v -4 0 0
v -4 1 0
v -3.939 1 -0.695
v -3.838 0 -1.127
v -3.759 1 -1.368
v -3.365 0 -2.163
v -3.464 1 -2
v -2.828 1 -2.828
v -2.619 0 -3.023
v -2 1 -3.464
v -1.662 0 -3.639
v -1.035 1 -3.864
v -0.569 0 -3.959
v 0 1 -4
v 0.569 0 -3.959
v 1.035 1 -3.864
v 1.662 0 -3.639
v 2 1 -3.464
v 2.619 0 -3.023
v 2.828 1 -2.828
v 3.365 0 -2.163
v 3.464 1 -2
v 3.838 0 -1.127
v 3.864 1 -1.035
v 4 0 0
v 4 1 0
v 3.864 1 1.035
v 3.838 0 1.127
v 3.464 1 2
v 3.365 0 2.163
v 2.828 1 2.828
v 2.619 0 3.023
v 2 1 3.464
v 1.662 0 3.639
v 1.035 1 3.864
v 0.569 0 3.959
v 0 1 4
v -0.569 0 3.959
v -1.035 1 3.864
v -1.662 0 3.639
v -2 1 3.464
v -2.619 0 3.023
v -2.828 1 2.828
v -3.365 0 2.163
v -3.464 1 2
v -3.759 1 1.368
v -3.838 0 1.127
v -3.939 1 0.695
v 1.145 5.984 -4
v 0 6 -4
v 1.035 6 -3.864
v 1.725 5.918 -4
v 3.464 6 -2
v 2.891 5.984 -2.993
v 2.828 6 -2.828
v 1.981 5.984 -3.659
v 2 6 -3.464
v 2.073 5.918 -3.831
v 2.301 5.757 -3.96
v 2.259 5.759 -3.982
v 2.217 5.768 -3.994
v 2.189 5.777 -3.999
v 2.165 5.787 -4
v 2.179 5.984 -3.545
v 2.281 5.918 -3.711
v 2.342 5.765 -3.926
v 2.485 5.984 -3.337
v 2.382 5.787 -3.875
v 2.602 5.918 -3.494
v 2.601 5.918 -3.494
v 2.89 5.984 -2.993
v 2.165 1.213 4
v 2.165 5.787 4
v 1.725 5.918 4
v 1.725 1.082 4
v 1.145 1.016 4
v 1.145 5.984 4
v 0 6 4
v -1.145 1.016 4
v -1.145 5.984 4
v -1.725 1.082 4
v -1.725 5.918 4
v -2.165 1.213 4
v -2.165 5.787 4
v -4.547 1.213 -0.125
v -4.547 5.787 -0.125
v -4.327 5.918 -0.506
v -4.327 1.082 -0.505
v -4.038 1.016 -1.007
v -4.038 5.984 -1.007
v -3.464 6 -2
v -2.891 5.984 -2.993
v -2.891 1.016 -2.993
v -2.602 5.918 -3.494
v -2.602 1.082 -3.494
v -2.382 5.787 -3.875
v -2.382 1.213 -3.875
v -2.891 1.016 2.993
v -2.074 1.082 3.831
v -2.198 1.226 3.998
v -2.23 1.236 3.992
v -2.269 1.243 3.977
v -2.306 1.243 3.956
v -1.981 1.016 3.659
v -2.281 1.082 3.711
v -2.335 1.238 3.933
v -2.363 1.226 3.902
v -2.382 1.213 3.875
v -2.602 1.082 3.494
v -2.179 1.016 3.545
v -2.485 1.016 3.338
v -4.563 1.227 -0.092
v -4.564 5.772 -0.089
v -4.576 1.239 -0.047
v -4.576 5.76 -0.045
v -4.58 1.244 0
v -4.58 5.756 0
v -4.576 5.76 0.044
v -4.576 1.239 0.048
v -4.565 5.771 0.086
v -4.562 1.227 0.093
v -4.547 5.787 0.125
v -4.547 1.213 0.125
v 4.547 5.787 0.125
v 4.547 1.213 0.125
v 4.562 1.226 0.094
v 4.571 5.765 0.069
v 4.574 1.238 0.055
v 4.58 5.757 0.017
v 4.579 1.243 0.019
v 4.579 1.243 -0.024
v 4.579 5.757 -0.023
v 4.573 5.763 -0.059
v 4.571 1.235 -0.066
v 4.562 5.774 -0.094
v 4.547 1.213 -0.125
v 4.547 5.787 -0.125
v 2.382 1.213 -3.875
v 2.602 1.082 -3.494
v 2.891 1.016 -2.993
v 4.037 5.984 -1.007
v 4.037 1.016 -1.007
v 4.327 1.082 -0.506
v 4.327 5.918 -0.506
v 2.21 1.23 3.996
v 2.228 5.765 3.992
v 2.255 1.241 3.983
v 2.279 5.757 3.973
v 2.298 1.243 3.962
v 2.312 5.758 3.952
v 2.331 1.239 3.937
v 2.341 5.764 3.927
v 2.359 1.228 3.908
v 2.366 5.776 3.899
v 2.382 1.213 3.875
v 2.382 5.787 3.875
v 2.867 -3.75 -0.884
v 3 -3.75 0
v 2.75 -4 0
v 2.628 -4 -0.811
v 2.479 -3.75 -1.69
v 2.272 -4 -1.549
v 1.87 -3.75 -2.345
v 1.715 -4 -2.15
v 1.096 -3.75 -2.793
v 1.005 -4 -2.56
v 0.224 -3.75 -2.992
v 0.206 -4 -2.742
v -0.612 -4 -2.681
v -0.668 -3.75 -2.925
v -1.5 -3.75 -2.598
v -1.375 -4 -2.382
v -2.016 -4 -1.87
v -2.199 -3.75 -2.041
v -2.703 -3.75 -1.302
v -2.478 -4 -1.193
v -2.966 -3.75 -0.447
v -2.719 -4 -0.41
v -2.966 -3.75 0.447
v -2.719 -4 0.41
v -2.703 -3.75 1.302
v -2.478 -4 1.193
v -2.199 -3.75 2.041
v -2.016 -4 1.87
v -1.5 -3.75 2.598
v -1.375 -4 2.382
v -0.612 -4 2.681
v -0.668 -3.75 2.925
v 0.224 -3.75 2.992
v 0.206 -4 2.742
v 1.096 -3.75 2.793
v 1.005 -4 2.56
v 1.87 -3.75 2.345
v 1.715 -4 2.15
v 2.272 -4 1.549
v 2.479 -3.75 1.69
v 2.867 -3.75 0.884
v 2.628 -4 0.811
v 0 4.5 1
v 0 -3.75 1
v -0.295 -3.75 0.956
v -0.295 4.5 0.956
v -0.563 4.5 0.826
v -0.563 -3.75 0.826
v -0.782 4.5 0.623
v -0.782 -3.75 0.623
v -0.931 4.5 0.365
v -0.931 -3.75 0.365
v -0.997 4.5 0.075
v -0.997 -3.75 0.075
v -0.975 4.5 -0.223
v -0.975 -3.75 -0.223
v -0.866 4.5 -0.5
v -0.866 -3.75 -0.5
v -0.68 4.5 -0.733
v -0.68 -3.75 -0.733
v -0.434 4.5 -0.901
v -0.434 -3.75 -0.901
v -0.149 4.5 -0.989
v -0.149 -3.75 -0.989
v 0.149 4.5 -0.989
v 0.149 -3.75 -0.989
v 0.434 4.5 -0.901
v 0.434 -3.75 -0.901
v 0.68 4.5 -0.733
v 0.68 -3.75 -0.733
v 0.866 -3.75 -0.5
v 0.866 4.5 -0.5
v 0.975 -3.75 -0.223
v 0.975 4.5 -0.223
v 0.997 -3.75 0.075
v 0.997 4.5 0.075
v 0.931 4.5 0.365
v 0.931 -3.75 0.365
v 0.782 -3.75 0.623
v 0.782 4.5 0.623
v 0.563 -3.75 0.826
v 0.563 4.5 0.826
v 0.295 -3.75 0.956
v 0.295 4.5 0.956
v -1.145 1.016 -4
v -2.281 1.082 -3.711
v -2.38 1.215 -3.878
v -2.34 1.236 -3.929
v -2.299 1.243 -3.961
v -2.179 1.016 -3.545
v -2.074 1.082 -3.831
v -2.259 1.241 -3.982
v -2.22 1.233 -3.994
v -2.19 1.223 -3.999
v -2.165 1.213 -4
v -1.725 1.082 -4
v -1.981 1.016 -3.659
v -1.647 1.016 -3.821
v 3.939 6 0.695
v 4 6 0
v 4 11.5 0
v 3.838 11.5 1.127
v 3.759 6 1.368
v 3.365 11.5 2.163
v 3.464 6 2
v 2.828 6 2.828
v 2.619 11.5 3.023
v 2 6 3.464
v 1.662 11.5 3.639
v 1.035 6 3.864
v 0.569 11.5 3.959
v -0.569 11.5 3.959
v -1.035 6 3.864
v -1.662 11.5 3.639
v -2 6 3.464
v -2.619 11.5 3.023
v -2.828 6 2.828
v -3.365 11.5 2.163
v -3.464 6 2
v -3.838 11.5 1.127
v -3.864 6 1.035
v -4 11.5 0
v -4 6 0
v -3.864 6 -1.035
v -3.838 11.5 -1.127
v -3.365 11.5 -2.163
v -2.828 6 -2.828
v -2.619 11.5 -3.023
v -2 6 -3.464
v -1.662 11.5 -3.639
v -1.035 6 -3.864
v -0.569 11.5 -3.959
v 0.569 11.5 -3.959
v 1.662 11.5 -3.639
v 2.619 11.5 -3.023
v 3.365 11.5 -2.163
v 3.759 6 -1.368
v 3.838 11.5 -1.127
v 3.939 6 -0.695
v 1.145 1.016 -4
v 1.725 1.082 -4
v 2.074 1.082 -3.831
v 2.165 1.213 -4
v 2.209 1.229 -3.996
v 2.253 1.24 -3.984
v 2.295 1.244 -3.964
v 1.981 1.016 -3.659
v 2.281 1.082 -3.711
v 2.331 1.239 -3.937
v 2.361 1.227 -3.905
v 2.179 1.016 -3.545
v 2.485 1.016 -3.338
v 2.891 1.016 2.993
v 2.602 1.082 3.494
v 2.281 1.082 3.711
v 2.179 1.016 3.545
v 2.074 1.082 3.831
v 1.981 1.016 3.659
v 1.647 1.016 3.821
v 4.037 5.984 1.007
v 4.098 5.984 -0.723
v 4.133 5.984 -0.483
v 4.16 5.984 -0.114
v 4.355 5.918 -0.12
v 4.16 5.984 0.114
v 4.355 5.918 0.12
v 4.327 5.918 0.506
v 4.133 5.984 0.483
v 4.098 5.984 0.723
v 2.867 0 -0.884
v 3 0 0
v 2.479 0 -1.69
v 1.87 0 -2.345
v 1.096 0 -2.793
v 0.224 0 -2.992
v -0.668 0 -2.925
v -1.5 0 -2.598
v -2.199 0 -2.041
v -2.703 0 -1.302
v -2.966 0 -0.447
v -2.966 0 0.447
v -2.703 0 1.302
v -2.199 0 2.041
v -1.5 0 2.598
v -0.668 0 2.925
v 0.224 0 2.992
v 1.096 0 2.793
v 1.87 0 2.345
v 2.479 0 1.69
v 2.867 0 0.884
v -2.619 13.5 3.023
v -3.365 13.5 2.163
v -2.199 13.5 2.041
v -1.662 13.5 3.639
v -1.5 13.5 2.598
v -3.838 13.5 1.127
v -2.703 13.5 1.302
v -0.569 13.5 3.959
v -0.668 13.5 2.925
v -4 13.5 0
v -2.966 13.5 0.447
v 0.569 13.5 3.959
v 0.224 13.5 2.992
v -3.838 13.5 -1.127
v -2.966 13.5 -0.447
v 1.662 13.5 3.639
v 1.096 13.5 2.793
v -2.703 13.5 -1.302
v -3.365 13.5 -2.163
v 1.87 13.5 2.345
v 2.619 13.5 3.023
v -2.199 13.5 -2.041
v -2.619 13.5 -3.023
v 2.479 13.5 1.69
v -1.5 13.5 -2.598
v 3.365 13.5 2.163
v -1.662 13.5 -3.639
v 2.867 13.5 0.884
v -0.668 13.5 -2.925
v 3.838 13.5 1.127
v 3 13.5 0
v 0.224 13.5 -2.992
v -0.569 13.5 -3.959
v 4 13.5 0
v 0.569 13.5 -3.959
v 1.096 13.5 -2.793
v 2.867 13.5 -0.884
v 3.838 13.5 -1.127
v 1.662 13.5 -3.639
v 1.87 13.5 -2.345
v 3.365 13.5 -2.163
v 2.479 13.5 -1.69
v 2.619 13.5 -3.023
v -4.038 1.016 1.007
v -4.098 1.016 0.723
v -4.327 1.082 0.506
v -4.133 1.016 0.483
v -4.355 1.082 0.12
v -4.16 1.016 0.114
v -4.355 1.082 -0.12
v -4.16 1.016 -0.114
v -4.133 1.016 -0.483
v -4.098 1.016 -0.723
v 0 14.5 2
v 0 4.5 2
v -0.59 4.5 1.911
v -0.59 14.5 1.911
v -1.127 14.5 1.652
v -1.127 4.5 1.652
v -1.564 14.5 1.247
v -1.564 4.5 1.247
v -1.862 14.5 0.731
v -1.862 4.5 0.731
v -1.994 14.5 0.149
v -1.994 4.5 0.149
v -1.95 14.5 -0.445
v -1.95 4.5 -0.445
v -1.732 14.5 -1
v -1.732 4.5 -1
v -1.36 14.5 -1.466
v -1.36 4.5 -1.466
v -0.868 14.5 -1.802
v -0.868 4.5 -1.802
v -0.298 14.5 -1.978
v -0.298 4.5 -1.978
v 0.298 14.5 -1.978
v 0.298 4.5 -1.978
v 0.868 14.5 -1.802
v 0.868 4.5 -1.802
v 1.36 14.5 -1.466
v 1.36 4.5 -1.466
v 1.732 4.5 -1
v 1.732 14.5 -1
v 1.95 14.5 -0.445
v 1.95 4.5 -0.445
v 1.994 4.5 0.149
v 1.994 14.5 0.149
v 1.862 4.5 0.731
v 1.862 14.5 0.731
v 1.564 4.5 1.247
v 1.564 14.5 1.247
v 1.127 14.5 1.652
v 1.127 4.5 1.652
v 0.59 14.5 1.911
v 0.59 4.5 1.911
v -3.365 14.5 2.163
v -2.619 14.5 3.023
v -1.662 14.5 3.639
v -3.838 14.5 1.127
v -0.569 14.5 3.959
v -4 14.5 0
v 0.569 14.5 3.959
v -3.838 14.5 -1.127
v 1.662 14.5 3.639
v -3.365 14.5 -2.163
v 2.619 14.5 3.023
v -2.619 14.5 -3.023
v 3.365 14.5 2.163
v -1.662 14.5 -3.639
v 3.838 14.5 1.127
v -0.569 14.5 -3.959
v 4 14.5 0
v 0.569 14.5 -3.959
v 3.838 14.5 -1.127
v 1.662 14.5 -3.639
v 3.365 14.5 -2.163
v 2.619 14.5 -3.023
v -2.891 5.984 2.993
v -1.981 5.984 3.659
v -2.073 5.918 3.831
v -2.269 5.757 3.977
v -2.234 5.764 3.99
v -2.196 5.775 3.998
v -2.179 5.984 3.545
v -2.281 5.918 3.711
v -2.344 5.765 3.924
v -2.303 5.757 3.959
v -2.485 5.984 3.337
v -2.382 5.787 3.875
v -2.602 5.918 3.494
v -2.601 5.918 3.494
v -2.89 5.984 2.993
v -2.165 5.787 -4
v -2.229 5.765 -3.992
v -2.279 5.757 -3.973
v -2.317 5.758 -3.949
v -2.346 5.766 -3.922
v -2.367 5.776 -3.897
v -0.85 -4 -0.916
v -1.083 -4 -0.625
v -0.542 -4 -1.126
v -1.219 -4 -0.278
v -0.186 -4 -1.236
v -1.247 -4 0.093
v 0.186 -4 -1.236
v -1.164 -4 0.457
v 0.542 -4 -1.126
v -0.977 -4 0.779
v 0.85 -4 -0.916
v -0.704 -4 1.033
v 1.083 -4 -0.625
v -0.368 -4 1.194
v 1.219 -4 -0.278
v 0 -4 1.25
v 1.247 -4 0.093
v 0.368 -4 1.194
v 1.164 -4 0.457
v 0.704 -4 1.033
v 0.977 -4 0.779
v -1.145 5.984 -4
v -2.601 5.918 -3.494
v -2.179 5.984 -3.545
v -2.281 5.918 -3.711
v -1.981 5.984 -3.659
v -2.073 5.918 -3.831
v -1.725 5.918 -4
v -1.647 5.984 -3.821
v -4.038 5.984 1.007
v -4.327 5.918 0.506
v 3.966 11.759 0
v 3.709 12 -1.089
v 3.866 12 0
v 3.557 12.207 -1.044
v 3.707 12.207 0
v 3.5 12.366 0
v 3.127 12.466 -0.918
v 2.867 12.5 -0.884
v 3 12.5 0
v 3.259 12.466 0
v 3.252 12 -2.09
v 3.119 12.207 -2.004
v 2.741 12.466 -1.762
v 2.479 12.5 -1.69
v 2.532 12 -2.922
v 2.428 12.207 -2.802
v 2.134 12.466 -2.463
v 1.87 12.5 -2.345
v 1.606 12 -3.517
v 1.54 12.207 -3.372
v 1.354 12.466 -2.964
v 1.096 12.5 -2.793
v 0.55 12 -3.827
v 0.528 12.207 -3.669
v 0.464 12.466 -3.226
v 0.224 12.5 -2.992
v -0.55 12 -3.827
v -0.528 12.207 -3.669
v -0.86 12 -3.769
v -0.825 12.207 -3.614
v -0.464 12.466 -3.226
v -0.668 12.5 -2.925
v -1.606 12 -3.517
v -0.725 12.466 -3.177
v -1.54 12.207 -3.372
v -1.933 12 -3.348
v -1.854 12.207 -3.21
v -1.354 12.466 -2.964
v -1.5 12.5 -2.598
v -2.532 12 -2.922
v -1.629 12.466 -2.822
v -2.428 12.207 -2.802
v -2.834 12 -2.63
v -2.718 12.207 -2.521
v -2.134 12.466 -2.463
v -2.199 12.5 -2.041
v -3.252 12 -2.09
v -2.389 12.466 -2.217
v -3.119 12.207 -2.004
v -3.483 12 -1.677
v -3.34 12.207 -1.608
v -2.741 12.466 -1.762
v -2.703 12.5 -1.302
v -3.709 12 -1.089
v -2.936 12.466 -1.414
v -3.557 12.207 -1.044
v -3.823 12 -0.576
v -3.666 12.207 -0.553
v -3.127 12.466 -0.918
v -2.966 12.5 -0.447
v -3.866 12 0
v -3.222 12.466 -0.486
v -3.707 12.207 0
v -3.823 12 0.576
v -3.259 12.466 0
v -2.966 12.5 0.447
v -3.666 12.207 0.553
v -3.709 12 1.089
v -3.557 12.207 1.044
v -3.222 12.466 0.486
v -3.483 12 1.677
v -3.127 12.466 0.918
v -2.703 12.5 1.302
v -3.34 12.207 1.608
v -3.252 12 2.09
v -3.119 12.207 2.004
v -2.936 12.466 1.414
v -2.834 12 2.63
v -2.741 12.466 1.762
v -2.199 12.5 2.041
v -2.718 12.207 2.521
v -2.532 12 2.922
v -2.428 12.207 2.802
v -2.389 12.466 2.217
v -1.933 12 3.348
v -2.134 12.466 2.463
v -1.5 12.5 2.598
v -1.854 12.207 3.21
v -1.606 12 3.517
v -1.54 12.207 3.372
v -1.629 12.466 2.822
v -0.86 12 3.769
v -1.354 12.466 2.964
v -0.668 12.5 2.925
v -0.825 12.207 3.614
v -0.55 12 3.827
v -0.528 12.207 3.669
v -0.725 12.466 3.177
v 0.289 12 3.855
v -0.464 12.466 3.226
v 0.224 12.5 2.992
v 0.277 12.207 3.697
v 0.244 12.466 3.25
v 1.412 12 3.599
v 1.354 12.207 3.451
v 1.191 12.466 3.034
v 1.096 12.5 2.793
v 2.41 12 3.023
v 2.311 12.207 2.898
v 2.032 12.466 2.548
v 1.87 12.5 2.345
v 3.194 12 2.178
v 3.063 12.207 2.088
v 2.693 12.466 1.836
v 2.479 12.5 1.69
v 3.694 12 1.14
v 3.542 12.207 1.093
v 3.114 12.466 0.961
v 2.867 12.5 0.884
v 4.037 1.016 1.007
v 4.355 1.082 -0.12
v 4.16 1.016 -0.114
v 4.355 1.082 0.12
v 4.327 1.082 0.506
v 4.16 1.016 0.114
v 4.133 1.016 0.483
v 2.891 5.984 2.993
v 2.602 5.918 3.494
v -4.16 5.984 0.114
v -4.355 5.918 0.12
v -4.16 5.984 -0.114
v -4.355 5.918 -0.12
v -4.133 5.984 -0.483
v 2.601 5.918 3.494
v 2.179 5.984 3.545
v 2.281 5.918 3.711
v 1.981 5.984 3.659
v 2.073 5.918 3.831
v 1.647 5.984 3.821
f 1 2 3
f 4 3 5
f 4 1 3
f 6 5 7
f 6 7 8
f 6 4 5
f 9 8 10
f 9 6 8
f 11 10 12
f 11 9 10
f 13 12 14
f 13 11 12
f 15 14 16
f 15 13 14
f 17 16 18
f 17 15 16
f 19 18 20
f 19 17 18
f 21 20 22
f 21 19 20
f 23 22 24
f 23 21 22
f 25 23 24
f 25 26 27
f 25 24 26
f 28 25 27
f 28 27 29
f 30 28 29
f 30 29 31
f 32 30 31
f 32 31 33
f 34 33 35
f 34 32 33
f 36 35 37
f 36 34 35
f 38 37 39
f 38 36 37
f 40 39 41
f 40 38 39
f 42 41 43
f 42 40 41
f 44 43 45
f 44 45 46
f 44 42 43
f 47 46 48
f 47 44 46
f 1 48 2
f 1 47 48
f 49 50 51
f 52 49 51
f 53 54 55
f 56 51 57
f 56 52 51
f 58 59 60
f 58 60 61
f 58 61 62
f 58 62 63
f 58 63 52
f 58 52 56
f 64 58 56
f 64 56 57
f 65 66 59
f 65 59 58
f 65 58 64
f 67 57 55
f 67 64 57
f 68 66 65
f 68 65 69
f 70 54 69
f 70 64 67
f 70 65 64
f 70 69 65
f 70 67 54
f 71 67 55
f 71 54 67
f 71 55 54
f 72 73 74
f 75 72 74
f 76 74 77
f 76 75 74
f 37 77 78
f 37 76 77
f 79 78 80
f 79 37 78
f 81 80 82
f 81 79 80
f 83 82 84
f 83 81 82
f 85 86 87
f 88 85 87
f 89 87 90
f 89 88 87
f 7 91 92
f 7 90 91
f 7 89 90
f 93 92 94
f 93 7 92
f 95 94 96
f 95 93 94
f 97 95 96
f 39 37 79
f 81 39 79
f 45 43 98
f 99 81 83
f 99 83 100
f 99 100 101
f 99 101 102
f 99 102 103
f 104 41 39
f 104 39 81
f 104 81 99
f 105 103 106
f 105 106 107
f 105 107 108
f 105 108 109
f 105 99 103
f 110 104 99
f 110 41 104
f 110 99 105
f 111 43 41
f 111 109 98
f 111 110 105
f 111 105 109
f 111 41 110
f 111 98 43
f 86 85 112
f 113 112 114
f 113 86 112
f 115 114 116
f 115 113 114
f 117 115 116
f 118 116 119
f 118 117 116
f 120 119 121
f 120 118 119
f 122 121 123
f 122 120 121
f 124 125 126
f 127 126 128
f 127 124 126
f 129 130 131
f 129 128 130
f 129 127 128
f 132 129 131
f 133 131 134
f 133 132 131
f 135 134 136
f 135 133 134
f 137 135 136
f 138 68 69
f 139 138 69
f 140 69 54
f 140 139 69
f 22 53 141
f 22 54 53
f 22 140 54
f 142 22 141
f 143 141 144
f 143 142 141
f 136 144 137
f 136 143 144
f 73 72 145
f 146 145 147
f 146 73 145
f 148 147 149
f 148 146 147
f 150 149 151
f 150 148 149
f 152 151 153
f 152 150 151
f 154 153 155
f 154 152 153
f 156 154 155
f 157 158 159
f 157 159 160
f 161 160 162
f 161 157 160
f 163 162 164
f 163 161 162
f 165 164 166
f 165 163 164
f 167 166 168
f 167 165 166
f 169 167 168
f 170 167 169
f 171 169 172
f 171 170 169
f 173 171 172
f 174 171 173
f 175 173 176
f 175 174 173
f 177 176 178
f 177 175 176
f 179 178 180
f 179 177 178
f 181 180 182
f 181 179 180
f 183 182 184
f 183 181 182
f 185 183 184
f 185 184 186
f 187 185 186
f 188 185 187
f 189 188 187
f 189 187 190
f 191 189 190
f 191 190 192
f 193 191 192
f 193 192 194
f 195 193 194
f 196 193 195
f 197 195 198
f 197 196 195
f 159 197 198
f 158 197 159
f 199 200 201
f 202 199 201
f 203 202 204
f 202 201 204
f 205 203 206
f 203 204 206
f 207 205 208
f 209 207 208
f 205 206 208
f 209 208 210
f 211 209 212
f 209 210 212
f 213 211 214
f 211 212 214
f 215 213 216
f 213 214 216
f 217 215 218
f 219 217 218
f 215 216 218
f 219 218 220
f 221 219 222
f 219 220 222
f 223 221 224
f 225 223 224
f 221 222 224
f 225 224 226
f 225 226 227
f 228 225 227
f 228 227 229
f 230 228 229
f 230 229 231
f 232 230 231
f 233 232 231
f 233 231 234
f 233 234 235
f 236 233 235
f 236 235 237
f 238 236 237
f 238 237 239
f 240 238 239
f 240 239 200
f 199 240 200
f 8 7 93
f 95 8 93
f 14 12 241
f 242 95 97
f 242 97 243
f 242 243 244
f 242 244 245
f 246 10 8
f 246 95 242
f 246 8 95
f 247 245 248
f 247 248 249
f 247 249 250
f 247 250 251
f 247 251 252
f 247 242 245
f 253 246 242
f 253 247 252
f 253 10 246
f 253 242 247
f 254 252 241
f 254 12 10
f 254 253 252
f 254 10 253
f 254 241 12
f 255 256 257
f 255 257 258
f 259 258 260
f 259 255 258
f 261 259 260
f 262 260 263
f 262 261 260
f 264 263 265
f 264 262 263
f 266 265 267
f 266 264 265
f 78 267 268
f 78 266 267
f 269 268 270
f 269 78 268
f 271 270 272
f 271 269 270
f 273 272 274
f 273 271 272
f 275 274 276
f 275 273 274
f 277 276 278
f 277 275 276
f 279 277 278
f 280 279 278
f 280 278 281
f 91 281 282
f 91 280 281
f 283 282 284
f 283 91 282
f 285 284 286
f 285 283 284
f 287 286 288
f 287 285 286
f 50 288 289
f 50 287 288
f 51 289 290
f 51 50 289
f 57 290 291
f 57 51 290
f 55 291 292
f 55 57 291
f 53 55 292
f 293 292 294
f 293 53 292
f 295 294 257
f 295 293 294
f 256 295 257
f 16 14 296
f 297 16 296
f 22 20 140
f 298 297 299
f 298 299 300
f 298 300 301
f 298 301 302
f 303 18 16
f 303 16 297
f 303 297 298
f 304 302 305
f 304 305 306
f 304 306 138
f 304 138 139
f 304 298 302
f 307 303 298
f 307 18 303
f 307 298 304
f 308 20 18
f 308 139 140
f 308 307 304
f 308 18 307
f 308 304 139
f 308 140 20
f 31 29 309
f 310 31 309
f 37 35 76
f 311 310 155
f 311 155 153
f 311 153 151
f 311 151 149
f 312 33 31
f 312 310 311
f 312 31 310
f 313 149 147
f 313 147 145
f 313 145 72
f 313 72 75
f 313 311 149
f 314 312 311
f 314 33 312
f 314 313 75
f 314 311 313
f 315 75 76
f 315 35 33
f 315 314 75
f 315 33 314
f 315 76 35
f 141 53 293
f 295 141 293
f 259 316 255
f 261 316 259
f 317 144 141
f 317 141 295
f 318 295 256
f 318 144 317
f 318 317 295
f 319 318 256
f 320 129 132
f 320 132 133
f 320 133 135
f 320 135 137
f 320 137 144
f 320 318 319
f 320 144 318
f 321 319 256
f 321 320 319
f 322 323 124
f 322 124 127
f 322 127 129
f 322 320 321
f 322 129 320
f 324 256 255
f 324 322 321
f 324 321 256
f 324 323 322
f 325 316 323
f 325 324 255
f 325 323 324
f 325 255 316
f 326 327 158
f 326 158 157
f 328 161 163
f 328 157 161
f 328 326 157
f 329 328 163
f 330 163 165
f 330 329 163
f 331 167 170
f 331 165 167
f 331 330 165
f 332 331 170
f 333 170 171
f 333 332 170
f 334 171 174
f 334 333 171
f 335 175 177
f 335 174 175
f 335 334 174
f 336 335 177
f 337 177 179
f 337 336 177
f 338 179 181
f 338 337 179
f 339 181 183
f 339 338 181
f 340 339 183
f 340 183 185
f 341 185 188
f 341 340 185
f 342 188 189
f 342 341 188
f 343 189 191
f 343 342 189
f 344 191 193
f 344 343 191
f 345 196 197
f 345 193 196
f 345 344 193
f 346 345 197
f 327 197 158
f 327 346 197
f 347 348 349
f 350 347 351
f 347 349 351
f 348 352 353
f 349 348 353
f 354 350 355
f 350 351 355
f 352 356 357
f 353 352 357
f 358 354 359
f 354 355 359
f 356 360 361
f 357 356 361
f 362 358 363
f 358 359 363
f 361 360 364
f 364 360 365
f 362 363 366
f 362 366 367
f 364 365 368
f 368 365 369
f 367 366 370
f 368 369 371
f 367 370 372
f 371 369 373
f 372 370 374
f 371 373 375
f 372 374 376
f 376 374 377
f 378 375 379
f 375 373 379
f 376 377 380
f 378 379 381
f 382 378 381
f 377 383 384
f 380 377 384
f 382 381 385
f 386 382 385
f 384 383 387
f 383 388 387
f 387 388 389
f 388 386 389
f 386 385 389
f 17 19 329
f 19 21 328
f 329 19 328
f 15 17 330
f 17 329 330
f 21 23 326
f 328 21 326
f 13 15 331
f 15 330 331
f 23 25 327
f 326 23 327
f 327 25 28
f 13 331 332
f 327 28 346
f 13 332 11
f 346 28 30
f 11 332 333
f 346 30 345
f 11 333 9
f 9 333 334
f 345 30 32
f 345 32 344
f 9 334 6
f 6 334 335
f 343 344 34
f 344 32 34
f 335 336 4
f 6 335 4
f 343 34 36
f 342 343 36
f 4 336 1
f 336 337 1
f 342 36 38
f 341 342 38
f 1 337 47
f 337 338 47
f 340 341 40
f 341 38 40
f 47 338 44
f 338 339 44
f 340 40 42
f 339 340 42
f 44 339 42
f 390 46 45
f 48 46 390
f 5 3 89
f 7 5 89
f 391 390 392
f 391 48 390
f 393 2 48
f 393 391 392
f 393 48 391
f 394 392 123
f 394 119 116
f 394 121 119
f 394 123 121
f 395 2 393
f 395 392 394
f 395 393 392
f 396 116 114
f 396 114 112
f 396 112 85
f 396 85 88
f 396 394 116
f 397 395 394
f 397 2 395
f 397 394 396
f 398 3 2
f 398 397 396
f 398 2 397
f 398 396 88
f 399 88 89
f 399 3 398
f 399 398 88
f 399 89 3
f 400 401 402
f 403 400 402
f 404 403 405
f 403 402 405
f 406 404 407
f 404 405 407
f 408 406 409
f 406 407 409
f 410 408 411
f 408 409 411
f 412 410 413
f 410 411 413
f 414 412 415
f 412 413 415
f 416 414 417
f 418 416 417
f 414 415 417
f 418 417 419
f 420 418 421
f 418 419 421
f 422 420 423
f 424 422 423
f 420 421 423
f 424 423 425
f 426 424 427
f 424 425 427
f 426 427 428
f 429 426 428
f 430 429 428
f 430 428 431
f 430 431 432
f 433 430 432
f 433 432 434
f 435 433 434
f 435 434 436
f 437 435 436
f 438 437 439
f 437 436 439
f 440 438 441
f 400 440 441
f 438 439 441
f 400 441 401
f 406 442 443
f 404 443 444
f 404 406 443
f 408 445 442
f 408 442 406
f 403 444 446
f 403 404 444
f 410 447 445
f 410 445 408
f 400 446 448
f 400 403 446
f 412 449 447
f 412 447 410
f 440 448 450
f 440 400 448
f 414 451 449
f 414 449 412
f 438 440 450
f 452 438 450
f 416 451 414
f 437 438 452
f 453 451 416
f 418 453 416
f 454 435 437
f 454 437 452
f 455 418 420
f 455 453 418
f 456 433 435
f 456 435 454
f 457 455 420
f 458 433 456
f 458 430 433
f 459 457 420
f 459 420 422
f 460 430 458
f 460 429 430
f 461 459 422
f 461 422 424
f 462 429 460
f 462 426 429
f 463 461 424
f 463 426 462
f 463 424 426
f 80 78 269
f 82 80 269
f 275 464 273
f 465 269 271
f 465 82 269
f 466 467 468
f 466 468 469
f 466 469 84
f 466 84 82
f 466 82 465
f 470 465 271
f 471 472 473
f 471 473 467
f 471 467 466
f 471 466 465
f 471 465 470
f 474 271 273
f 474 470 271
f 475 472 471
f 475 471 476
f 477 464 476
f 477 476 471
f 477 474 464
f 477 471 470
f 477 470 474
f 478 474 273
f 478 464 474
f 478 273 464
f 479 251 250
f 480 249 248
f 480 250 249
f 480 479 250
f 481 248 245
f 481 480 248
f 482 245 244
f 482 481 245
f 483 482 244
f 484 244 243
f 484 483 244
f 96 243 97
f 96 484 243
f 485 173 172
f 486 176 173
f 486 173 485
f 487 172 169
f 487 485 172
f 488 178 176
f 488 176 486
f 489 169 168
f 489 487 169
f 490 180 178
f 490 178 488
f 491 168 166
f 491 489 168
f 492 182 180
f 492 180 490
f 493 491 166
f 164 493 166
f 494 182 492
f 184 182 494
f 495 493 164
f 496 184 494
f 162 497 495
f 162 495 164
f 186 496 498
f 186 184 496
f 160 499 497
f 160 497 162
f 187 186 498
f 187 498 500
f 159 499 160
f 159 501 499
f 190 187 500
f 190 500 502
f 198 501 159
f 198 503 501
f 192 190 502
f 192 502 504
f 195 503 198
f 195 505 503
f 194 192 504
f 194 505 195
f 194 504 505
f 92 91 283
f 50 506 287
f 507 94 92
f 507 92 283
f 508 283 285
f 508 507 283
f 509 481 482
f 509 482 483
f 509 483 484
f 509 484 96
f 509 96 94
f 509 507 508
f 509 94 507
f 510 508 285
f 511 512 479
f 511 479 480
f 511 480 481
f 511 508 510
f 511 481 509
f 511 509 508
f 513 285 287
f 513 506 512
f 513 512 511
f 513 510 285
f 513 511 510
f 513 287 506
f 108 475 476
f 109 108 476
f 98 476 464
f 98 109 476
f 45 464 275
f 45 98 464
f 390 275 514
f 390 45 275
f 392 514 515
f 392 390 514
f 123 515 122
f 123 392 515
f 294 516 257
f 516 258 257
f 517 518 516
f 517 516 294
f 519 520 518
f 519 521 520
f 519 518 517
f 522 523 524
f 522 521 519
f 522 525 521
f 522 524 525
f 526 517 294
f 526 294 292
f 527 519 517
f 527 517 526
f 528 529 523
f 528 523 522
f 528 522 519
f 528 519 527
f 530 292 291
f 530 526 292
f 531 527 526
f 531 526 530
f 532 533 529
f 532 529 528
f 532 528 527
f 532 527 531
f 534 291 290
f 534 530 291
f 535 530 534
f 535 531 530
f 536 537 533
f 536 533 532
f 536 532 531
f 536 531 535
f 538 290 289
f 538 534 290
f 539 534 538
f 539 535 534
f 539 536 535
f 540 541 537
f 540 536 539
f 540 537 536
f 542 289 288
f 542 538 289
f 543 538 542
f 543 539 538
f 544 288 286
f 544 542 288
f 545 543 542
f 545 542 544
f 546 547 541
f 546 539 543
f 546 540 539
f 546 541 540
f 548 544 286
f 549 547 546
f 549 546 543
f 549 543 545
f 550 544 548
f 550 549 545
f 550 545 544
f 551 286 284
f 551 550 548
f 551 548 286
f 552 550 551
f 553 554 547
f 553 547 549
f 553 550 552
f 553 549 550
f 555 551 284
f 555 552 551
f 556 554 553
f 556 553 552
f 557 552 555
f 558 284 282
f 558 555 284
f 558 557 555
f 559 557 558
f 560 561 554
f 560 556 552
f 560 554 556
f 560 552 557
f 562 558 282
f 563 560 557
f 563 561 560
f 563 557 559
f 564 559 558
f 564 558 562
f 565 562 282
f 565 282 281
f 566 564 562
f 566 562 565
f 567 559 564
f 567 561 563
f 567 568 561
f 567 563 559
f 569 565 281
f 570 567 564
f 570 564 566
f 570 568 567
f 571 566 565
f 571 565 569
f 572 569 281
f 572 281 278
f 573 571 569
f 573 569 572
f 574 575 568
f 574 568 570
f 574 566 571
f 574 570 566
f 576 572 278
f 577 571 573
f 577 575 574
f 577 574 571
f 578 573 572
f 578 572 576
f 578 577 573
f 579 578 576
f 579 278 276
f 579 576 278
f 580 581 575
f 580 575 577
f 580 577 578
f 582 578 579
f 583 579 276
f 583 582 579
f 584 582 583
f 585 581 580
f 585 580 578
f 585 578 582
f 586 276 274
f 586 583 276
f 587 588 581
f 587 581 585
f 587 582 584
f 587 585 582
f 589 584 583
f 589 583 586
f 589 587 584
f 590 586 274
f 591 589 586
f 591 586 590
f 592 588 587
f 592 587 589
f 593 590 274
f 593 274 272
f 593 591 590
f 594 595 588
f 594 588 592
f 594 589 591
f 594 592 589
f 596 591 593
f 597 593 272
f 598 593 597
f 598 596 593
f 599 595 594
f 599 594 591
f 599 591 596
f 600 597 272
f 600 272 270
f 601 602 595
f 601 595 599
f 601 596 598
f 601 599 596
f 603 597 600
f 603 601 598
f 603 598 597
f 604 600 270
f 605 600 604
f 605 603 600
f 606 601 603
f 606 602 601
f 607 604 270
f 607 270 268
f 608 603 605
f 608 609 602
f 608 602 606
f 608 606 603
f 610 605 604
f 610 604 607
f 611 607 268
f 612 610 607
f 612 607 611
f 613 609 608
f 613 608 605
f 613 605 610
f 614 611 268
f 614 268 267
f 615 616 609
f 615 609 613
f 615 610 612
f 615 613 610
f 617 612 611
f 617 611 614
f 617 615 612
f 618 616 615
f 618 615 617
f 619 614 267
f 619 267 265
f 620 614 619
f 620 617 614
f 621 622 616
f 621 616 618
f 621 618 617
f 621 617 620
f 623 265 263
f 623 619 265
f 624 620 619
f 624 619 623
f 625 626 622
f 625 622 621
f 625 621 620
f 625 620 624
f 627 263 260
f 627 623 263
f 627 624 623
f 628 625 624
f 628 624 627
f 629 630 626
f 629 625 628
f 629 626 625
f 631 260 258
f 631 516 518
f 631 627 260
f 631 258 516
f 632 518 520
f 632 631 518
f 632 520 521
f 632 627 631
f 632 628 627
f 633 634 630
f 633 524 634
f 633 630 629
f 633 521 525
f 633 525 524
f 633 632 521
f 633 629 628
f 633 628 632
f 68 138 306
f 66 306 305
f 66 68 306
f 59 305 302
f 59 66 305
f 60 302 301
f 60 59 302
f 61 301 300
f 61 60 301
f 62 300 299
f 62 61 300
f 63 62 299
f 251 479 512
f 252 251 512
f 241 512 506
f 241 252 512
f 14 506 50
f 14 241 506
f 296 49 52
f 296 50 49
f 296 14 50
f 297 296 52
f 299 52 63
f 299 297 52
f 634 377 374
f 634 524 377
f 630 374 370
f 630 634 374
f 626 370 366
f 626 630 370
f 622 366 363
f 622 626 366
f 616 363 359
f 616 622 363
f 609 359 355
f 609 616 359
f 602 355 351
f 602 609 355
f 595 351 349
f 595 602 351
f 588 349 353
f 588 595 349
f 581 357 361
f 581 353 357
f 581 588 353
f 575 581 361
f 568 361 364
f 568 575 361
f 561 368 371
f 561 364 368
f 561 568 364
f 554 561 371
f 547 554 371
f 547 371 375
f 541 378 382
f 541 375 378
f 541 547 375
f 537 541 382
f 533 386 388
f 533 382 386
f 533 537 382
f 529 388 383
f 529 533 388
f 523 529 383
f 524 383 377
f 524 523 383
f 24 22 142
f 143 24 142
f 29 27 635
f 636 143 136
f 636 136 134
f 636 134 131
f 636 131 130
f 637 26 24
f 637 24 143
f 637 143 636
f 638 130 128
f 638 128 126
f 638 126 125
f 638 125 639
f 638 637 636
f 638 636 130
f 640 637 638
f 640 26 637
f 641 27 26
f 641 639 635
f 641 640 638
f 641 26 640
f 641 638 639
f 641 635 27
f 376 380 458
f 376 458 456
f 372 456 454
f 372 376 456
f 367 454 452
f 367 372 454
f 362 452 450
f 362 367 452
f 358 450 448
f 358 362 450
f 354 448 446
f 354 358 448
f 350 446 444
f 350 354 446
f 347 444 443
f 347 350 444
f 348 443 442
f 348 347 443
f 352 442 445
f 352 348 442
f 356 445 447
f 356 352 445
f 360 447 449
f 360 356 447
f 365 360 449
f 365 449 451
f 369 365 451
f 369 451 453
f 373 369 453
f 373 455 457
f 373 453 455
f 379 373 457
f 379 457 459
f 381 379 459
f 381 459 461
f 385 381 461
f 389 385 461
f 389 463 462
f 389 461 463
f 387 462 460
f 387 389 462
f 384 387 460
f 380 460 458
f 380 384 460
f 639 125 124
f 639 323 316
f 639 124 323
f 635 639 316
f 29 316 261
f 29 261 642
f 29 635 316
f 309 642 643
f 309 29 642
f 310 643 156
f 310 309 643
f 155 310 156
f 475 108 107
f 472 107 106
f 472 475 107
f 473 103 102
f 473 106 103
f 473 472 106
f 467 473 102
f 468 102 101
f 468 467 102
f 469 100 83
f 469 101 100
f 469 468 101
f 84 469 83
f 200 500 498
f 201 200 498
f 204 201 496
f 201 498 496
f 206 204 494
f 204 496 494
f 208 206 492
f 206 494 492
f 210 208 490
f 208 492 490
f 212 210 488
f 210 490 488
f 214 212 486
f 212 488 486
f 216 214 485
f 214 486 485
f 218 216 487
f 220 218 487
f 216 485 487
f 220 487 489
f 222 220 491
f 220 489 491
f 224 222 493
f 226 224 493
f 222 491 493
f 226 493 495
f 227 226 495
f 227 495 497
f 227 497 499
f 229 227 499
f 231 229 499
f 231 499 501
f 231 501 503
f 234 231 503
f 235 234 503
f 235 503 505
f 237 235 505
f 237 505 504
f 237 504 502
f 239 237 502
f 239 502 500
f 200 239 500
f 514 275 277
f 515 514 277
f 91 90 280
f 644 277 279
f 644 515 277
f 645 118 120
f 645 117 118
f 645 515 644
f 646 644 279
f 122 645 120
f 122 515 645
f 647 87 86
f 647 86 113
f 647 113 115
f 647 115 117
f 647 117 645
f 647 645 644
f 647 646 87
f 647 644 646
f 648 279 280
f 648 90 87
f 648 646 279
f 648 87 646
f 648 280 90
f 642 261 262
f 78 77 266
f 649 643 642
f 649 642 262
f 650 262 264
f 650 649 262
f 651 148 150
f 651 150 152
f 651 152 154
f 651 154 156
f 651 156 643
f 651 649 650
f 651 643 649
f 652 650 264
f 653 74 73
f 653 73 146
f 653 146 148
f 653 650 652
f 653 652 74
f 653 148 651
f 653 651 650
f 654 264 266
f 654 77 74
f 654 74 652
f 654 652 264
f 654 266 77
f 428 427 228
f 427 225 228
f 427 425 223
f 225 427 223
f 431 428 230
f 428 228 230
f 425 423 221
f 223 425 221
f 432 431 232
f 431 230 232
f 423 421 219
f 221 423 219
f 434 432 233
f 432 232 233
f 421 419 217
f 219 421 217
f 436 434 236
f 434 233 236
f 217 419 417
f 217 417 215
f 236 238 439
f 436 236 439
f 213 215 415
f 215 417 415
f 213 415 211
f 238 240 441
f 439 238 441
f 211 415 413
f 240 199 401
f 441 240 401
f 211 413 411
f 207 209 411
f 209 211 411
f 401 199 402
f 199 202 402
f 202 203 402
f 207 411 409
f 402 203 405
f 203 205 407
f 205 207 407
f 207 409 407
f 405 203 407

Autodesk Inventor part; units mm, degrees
ref_plane "YZ Plane" through (0, 0, 0) normal (1, 0, 0) x (0, 1, 0)
ref_plane "XZ Plane" through (0, 0, 0) normal (0, 1, 0) x (-1, 0, 0)
ref_plane "XY Plane" through (0, 0, 0) normal (0, 0, 1) x (1, 0, 0)
sketch "草圖1" plane through (0, 0, 0) normal (0, 1, 0) x (-1, 0, 0)
  circle A0 centre (0, 0) radius 4
  dimension "d0" = 8
extrude "擠出1" add sketch "草圖1" along normal blind 1
sketch "草圖2" plane through (0, 1, 0) normal (0, 1, 0) x (1, 0, 0)
  circle A0 centre (0, 0) radius 4 projected
  line L0 (2.3094, 4) -> (4.6188, 0)
  line L1 (4.6188, 0) -> (2.3094, -4)
  line L2 (2.3094, -4) -> (-2.3094, -4)
  line L3 (-2.3094, -4) -> (-4.6188, 0)
  line L4 (-4.6188, 0) -> (-2.3094, 4)
  line L5 (-2.3094, 4) -> (2.3094, 4)
  point P0 (0, 4)
extrude "擠出2" add sketch "草圖2" along normal blind 5
sketch "草圖3" plane through (0, 6, 0) normal (0, 1, 0) x (1, 0, 0)
  circle A0 centre (0, 0) radius 4
  dimension "d49" = 8
extrude "擠出3" add sketch "草圖3" along normal blind 6.5
fillet "圓角1" radius 1 1 edges at (-4, 12.5, 0)
sketch "草圖4" plane through (0, 12.5, 0) normal (0, 1, 0) x (1, 0, 0)
  circle A0 centre (0, 0) radius 3 projected
  circle A1 centre (0, 0) radius 3
extrude "擠出4" add sketch "草圖4" along normal blind 1
sketch "草圖5" plane through (0, 13.5, 0) normal (0, 1, 0) x (1, 0, 0)
  circle A0 centre (0, 0) radius 3 projected
  circle A1 centre (0, 0) radius 4
  dimension "d11" = 8
extrude "擠出5" add sketch "草圖5" along normal blind 1 contours A0 | A1
fillet "圓角2" radius 0.25 6 edges at (4.6188, 3.5, 0) (2.3094, 3.5, 4) (2.3094, 3.5, -4) (-2.3094, 3.5, -4) (-4.6188, 3.5, 0) (-2.3094, 3.5, 4)
sketch "草圖9" plane through (0, 0, 0) normal (0, 0, 1) x (1, 0, 0)
  line L0 (-4.75, 6) -> (-4, 6)
  line L1 (-4.75, 1) -> (-4, 1)
  line L2 (-4.75, 6) -> (-4.75, 5.5)
  line L3 (-4.75, 1) -> (-4.75, 1.5)
  arc A0 (-4, 6) -> (-4.75, 5.5) centre (-4, 5.1875) ccw
  arc A1 (-4.75, 1.5) -> (-4, 1) centre (-4, 1.8125) ccw
  line L4 (0, 0) -> (0, 9)
  dimension "d39" = 1
  dimension "d40" = 5
  dimension "d41" = 4
  dimension "d42" = 4
  dimension "d43" = 0.75
  dimension "d44" = 0.75
  dimension "d45" = 0.5
  dimension "d46" = 0.5
revolve "迴轉1" cut sketch "草圖9" angle 360 about axis through (0, 0, 0) along (0, 1, 0)
sketch "草圖10" plane through (0, 0, 0) normal (0, -1, 0) x (1, 0, 0)
  circle A0 centre (0, 0) radius 4 projected
  circle A1 centre (0, 0) radius 3
  dimension "d54" = 6
extrude "擠出6" add sketch "草圖10" along normal blind 4 contours A1
thread "螺紋2" size "M6x1" class "6g" standard "ANSI Metric M Profile" full length
sketch "草圖11" plane through (0, 14.5, 0) normal (0, 1, 0) x (1, 0, 0)
  circle A0 centre (0, 0) radius 4 projected
hole "孔4" at (0, 14.5, 0) direction (0, -1, 0) diameter 2 end through all counterbore diameter 4 counterbore depth 10
chamfer "倒角1" distance 0.25 angle 45 2 edges at (-3, -4, 0) (0, -4, -1)
properties part number "pc4_m10"
